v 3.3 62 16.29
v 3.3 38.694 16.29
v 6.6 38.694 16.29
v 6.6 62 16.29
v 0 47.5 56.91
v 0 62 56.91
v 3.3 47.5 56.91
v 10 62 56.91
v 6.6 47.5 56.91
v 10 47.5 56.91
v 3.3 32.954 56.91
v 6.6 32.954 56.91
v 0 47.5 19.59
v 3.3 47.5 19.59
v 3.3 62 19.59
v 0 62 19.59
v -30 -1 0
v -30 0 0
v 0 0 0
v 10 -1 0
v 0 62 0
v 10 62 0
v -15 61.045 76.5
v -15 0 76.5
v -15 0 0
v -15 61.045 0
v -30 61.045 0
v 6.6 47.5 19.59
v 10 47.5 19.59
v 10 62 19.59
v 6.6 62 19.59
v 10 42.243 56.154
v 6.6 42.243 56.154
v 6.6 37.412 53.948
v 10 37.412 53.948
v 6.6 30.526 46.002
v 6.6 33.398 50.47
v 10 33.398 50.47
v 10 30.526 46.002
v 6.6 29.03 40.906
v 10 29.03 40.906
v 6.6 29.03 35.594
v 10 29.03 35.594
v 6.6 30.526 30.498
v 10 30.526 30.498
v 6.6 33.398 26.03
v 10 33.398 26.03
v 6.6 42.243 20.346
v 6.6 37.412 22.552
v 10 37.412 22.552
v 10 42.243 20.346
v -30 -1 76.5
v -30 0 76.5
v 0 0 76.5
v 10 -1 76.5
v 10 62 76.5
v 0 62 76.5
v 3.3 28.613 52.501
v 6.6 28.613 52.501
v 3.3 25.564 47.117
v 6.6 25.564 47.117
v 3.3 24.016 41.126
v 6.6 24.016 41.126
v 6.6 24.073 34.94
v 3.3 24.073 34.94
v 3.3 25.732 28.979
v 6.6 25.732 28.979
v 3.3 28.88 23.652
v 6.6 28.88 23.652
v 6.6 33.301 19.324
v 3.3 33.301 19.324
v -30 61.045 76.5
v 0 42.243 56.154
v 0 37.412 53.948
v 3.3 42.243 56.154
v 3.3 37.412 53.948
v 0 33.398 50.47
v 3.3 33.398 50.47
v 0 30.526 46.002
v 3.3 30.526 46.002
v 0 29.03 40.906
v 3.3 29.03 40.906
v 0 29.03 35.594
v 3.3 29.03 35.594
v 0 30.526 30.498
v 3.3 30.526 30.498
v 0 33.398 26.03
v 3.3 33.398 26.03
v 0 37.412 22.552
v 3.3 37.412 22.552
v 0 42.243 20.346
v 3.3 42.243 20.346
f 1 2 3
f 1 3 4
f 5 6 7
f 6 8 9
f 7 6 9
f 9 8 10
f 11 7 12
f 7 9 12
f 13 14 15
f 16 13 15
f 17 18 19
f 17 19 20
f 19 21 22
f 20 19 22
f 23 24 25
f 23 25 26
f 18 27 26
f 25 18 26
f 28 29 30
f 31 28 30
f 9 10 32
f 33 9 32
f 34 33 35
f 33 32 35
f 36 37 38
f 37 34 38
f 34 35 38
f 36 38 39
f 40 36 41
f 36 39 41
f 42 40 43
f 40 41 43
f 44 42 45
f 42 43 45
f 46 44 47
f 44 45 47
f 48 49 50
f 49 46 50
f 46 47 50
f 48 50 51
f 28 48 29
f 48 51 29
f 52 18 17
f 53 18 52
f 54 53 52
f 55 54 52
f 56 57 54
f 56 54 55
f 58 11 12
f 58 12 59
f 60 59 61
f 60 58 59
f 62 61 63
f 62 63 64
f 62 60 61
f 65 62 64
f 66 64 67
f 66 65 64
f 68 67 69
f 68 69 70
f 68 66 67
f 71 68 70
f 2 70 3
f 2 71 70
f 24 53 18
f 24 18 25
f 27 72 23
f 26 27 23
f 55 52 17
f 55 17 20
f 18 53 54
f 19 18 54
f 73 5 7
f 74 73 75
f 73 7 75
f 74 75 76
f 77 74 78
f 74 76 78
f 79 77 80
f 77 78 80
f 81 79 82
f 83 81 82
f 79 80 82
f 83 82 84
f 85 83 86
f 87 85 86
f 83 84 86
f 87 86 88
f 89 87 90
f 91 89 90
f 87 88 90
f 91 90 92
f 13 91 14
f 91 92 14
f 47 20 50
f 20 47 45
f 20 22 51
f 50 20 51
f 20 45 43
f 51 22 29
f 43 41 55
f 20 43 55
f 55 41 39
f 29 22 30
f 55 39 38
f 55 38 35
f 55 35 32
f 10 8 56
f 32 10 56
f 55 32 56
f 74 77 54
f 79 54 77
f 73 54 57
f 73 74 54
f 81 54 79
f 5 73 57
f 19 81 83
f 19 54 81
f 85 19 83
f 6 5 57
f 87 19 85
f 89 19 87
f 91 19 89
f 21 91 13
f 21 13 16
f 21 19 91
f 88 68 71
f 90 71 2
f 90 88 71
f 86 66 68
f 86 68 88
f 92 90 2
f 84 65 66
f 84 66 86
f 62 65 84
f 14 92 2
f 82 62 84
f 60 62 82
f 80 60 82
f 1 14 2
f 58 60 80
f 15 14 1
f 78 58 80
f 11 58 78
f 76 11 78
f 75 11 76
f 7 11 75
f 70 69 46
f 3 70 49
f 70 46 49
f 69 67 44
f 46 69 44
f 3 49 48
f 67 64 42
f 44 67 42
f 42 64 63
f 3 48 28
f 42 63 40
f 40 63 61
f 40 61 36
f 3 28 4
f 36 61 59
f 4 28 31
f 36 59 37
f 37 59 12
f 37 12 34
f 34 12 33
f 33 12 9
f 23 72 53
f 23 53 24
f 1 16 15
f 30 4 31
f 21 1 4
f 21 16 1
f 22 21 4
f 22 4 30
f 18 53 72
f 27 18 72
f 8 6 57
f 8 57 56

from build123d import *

# Parameters (mm, degrees)
SKETCH1_W           = 10
SKETCH1_H           = 62
BOSS_EXTRUDE1_DEPTH = 76.5
CUT_EXTRUDE1_DEPTH  = 76.5
CUT_EXTRUDE3_START  = 3.3
CUT_EXTRUDE3_DEPTH  = 3.3
SKETCH4_W           = 40
SKETCH4_H           = 76.5
BOSS_EXTRUDE2_DEPTH = 1
SKETCH5_W           = 15
SKETCH5_H           = 61.045159153
BOSS_EXTRUDE3_DEPTH = 76.5


# Read off the part's stored shape, not the designer's step: Cut-Extrude3
with BuildPart() as part:
    # Sketch1 → Boss-Extrude1 (new body)
    with BuildSketch(Plane.XY):
        with Locations((5, 31)):
            Rectangle(SKETCH1_W, SKETCH1_H)
    extrude(amount=BOSS_EXTRUDE1_DEPTH)

    # Sketch2 → Cut-Extrude1 (cut)
    with BuildSketch(Plane(origin=(10, 0, 0), x_dir=(0, 0, -1), z_dir=(1, 0, 0))):
        with BuildLine():
            Line((-19.59, 62), (-56.91, 62))
            Line((-56.91, 62), (-56.91, 47.5))
            ThreePointArc((-56.91, 47.5), (-38.25, 28.84), (-19.59, 47.5))
            Line((-19.59, 47.5), (-19.59, 62))
        make_face()
    extrude(amount=-CUT_EXTRUDE1_DEPTH, mode=Mode.SUBTRACT)

    # Cut-Extrude3 outline → Cut-Extrude3 (cut)
    with BuildSketch(Plane.YZ.offset(CUT_EXTRUDE3_START)):
        with BuildLine():
            ThreePointArc((47.5, 19.59), (28.84, 38.25), (47.5, 56.91))
            Line((47.5, 56.91), (32.953522763, 56.91))
            ThreePointArc((32.953522763, 56.91), (24.072746784, 34.939500531), (38.693525109, 16.29))
            Line((38.693525109, 16.29), (62, 16.29))
            Line((62, 16.29), (62, 19.59))
            Line((62, 19.59), (47.5, 19.59))
        make_face()
    extrude(amount=CUT_EXTRUDE3_DEPTH, mode=Mode.SUBTRACT)

    # Sketch4 → Boss-Extrude2 (add)
    with BuildSketch(Plane.XZ):
        with Locations((-10, 38.25)):
            Rectangle(SKETCH4_W, SKETCH4_H)
    extrude(amount=BOSS_EXTRUDE2_DEPTH)


with BuildPart() as body_2:
    # Sketch5 → Boss-Extrude3 (new body)
    with BuildSketch(Plane.XY.offset(76.5)):
        with Locations((-22.5, 30.522579577)):
            Rectangle(SKETCH5_W, SKETCH5_H)
    extrude(amount=-BOSS_EXTRUDE3_DEPTH)


solid = Compound([part.part, body_2.part])
